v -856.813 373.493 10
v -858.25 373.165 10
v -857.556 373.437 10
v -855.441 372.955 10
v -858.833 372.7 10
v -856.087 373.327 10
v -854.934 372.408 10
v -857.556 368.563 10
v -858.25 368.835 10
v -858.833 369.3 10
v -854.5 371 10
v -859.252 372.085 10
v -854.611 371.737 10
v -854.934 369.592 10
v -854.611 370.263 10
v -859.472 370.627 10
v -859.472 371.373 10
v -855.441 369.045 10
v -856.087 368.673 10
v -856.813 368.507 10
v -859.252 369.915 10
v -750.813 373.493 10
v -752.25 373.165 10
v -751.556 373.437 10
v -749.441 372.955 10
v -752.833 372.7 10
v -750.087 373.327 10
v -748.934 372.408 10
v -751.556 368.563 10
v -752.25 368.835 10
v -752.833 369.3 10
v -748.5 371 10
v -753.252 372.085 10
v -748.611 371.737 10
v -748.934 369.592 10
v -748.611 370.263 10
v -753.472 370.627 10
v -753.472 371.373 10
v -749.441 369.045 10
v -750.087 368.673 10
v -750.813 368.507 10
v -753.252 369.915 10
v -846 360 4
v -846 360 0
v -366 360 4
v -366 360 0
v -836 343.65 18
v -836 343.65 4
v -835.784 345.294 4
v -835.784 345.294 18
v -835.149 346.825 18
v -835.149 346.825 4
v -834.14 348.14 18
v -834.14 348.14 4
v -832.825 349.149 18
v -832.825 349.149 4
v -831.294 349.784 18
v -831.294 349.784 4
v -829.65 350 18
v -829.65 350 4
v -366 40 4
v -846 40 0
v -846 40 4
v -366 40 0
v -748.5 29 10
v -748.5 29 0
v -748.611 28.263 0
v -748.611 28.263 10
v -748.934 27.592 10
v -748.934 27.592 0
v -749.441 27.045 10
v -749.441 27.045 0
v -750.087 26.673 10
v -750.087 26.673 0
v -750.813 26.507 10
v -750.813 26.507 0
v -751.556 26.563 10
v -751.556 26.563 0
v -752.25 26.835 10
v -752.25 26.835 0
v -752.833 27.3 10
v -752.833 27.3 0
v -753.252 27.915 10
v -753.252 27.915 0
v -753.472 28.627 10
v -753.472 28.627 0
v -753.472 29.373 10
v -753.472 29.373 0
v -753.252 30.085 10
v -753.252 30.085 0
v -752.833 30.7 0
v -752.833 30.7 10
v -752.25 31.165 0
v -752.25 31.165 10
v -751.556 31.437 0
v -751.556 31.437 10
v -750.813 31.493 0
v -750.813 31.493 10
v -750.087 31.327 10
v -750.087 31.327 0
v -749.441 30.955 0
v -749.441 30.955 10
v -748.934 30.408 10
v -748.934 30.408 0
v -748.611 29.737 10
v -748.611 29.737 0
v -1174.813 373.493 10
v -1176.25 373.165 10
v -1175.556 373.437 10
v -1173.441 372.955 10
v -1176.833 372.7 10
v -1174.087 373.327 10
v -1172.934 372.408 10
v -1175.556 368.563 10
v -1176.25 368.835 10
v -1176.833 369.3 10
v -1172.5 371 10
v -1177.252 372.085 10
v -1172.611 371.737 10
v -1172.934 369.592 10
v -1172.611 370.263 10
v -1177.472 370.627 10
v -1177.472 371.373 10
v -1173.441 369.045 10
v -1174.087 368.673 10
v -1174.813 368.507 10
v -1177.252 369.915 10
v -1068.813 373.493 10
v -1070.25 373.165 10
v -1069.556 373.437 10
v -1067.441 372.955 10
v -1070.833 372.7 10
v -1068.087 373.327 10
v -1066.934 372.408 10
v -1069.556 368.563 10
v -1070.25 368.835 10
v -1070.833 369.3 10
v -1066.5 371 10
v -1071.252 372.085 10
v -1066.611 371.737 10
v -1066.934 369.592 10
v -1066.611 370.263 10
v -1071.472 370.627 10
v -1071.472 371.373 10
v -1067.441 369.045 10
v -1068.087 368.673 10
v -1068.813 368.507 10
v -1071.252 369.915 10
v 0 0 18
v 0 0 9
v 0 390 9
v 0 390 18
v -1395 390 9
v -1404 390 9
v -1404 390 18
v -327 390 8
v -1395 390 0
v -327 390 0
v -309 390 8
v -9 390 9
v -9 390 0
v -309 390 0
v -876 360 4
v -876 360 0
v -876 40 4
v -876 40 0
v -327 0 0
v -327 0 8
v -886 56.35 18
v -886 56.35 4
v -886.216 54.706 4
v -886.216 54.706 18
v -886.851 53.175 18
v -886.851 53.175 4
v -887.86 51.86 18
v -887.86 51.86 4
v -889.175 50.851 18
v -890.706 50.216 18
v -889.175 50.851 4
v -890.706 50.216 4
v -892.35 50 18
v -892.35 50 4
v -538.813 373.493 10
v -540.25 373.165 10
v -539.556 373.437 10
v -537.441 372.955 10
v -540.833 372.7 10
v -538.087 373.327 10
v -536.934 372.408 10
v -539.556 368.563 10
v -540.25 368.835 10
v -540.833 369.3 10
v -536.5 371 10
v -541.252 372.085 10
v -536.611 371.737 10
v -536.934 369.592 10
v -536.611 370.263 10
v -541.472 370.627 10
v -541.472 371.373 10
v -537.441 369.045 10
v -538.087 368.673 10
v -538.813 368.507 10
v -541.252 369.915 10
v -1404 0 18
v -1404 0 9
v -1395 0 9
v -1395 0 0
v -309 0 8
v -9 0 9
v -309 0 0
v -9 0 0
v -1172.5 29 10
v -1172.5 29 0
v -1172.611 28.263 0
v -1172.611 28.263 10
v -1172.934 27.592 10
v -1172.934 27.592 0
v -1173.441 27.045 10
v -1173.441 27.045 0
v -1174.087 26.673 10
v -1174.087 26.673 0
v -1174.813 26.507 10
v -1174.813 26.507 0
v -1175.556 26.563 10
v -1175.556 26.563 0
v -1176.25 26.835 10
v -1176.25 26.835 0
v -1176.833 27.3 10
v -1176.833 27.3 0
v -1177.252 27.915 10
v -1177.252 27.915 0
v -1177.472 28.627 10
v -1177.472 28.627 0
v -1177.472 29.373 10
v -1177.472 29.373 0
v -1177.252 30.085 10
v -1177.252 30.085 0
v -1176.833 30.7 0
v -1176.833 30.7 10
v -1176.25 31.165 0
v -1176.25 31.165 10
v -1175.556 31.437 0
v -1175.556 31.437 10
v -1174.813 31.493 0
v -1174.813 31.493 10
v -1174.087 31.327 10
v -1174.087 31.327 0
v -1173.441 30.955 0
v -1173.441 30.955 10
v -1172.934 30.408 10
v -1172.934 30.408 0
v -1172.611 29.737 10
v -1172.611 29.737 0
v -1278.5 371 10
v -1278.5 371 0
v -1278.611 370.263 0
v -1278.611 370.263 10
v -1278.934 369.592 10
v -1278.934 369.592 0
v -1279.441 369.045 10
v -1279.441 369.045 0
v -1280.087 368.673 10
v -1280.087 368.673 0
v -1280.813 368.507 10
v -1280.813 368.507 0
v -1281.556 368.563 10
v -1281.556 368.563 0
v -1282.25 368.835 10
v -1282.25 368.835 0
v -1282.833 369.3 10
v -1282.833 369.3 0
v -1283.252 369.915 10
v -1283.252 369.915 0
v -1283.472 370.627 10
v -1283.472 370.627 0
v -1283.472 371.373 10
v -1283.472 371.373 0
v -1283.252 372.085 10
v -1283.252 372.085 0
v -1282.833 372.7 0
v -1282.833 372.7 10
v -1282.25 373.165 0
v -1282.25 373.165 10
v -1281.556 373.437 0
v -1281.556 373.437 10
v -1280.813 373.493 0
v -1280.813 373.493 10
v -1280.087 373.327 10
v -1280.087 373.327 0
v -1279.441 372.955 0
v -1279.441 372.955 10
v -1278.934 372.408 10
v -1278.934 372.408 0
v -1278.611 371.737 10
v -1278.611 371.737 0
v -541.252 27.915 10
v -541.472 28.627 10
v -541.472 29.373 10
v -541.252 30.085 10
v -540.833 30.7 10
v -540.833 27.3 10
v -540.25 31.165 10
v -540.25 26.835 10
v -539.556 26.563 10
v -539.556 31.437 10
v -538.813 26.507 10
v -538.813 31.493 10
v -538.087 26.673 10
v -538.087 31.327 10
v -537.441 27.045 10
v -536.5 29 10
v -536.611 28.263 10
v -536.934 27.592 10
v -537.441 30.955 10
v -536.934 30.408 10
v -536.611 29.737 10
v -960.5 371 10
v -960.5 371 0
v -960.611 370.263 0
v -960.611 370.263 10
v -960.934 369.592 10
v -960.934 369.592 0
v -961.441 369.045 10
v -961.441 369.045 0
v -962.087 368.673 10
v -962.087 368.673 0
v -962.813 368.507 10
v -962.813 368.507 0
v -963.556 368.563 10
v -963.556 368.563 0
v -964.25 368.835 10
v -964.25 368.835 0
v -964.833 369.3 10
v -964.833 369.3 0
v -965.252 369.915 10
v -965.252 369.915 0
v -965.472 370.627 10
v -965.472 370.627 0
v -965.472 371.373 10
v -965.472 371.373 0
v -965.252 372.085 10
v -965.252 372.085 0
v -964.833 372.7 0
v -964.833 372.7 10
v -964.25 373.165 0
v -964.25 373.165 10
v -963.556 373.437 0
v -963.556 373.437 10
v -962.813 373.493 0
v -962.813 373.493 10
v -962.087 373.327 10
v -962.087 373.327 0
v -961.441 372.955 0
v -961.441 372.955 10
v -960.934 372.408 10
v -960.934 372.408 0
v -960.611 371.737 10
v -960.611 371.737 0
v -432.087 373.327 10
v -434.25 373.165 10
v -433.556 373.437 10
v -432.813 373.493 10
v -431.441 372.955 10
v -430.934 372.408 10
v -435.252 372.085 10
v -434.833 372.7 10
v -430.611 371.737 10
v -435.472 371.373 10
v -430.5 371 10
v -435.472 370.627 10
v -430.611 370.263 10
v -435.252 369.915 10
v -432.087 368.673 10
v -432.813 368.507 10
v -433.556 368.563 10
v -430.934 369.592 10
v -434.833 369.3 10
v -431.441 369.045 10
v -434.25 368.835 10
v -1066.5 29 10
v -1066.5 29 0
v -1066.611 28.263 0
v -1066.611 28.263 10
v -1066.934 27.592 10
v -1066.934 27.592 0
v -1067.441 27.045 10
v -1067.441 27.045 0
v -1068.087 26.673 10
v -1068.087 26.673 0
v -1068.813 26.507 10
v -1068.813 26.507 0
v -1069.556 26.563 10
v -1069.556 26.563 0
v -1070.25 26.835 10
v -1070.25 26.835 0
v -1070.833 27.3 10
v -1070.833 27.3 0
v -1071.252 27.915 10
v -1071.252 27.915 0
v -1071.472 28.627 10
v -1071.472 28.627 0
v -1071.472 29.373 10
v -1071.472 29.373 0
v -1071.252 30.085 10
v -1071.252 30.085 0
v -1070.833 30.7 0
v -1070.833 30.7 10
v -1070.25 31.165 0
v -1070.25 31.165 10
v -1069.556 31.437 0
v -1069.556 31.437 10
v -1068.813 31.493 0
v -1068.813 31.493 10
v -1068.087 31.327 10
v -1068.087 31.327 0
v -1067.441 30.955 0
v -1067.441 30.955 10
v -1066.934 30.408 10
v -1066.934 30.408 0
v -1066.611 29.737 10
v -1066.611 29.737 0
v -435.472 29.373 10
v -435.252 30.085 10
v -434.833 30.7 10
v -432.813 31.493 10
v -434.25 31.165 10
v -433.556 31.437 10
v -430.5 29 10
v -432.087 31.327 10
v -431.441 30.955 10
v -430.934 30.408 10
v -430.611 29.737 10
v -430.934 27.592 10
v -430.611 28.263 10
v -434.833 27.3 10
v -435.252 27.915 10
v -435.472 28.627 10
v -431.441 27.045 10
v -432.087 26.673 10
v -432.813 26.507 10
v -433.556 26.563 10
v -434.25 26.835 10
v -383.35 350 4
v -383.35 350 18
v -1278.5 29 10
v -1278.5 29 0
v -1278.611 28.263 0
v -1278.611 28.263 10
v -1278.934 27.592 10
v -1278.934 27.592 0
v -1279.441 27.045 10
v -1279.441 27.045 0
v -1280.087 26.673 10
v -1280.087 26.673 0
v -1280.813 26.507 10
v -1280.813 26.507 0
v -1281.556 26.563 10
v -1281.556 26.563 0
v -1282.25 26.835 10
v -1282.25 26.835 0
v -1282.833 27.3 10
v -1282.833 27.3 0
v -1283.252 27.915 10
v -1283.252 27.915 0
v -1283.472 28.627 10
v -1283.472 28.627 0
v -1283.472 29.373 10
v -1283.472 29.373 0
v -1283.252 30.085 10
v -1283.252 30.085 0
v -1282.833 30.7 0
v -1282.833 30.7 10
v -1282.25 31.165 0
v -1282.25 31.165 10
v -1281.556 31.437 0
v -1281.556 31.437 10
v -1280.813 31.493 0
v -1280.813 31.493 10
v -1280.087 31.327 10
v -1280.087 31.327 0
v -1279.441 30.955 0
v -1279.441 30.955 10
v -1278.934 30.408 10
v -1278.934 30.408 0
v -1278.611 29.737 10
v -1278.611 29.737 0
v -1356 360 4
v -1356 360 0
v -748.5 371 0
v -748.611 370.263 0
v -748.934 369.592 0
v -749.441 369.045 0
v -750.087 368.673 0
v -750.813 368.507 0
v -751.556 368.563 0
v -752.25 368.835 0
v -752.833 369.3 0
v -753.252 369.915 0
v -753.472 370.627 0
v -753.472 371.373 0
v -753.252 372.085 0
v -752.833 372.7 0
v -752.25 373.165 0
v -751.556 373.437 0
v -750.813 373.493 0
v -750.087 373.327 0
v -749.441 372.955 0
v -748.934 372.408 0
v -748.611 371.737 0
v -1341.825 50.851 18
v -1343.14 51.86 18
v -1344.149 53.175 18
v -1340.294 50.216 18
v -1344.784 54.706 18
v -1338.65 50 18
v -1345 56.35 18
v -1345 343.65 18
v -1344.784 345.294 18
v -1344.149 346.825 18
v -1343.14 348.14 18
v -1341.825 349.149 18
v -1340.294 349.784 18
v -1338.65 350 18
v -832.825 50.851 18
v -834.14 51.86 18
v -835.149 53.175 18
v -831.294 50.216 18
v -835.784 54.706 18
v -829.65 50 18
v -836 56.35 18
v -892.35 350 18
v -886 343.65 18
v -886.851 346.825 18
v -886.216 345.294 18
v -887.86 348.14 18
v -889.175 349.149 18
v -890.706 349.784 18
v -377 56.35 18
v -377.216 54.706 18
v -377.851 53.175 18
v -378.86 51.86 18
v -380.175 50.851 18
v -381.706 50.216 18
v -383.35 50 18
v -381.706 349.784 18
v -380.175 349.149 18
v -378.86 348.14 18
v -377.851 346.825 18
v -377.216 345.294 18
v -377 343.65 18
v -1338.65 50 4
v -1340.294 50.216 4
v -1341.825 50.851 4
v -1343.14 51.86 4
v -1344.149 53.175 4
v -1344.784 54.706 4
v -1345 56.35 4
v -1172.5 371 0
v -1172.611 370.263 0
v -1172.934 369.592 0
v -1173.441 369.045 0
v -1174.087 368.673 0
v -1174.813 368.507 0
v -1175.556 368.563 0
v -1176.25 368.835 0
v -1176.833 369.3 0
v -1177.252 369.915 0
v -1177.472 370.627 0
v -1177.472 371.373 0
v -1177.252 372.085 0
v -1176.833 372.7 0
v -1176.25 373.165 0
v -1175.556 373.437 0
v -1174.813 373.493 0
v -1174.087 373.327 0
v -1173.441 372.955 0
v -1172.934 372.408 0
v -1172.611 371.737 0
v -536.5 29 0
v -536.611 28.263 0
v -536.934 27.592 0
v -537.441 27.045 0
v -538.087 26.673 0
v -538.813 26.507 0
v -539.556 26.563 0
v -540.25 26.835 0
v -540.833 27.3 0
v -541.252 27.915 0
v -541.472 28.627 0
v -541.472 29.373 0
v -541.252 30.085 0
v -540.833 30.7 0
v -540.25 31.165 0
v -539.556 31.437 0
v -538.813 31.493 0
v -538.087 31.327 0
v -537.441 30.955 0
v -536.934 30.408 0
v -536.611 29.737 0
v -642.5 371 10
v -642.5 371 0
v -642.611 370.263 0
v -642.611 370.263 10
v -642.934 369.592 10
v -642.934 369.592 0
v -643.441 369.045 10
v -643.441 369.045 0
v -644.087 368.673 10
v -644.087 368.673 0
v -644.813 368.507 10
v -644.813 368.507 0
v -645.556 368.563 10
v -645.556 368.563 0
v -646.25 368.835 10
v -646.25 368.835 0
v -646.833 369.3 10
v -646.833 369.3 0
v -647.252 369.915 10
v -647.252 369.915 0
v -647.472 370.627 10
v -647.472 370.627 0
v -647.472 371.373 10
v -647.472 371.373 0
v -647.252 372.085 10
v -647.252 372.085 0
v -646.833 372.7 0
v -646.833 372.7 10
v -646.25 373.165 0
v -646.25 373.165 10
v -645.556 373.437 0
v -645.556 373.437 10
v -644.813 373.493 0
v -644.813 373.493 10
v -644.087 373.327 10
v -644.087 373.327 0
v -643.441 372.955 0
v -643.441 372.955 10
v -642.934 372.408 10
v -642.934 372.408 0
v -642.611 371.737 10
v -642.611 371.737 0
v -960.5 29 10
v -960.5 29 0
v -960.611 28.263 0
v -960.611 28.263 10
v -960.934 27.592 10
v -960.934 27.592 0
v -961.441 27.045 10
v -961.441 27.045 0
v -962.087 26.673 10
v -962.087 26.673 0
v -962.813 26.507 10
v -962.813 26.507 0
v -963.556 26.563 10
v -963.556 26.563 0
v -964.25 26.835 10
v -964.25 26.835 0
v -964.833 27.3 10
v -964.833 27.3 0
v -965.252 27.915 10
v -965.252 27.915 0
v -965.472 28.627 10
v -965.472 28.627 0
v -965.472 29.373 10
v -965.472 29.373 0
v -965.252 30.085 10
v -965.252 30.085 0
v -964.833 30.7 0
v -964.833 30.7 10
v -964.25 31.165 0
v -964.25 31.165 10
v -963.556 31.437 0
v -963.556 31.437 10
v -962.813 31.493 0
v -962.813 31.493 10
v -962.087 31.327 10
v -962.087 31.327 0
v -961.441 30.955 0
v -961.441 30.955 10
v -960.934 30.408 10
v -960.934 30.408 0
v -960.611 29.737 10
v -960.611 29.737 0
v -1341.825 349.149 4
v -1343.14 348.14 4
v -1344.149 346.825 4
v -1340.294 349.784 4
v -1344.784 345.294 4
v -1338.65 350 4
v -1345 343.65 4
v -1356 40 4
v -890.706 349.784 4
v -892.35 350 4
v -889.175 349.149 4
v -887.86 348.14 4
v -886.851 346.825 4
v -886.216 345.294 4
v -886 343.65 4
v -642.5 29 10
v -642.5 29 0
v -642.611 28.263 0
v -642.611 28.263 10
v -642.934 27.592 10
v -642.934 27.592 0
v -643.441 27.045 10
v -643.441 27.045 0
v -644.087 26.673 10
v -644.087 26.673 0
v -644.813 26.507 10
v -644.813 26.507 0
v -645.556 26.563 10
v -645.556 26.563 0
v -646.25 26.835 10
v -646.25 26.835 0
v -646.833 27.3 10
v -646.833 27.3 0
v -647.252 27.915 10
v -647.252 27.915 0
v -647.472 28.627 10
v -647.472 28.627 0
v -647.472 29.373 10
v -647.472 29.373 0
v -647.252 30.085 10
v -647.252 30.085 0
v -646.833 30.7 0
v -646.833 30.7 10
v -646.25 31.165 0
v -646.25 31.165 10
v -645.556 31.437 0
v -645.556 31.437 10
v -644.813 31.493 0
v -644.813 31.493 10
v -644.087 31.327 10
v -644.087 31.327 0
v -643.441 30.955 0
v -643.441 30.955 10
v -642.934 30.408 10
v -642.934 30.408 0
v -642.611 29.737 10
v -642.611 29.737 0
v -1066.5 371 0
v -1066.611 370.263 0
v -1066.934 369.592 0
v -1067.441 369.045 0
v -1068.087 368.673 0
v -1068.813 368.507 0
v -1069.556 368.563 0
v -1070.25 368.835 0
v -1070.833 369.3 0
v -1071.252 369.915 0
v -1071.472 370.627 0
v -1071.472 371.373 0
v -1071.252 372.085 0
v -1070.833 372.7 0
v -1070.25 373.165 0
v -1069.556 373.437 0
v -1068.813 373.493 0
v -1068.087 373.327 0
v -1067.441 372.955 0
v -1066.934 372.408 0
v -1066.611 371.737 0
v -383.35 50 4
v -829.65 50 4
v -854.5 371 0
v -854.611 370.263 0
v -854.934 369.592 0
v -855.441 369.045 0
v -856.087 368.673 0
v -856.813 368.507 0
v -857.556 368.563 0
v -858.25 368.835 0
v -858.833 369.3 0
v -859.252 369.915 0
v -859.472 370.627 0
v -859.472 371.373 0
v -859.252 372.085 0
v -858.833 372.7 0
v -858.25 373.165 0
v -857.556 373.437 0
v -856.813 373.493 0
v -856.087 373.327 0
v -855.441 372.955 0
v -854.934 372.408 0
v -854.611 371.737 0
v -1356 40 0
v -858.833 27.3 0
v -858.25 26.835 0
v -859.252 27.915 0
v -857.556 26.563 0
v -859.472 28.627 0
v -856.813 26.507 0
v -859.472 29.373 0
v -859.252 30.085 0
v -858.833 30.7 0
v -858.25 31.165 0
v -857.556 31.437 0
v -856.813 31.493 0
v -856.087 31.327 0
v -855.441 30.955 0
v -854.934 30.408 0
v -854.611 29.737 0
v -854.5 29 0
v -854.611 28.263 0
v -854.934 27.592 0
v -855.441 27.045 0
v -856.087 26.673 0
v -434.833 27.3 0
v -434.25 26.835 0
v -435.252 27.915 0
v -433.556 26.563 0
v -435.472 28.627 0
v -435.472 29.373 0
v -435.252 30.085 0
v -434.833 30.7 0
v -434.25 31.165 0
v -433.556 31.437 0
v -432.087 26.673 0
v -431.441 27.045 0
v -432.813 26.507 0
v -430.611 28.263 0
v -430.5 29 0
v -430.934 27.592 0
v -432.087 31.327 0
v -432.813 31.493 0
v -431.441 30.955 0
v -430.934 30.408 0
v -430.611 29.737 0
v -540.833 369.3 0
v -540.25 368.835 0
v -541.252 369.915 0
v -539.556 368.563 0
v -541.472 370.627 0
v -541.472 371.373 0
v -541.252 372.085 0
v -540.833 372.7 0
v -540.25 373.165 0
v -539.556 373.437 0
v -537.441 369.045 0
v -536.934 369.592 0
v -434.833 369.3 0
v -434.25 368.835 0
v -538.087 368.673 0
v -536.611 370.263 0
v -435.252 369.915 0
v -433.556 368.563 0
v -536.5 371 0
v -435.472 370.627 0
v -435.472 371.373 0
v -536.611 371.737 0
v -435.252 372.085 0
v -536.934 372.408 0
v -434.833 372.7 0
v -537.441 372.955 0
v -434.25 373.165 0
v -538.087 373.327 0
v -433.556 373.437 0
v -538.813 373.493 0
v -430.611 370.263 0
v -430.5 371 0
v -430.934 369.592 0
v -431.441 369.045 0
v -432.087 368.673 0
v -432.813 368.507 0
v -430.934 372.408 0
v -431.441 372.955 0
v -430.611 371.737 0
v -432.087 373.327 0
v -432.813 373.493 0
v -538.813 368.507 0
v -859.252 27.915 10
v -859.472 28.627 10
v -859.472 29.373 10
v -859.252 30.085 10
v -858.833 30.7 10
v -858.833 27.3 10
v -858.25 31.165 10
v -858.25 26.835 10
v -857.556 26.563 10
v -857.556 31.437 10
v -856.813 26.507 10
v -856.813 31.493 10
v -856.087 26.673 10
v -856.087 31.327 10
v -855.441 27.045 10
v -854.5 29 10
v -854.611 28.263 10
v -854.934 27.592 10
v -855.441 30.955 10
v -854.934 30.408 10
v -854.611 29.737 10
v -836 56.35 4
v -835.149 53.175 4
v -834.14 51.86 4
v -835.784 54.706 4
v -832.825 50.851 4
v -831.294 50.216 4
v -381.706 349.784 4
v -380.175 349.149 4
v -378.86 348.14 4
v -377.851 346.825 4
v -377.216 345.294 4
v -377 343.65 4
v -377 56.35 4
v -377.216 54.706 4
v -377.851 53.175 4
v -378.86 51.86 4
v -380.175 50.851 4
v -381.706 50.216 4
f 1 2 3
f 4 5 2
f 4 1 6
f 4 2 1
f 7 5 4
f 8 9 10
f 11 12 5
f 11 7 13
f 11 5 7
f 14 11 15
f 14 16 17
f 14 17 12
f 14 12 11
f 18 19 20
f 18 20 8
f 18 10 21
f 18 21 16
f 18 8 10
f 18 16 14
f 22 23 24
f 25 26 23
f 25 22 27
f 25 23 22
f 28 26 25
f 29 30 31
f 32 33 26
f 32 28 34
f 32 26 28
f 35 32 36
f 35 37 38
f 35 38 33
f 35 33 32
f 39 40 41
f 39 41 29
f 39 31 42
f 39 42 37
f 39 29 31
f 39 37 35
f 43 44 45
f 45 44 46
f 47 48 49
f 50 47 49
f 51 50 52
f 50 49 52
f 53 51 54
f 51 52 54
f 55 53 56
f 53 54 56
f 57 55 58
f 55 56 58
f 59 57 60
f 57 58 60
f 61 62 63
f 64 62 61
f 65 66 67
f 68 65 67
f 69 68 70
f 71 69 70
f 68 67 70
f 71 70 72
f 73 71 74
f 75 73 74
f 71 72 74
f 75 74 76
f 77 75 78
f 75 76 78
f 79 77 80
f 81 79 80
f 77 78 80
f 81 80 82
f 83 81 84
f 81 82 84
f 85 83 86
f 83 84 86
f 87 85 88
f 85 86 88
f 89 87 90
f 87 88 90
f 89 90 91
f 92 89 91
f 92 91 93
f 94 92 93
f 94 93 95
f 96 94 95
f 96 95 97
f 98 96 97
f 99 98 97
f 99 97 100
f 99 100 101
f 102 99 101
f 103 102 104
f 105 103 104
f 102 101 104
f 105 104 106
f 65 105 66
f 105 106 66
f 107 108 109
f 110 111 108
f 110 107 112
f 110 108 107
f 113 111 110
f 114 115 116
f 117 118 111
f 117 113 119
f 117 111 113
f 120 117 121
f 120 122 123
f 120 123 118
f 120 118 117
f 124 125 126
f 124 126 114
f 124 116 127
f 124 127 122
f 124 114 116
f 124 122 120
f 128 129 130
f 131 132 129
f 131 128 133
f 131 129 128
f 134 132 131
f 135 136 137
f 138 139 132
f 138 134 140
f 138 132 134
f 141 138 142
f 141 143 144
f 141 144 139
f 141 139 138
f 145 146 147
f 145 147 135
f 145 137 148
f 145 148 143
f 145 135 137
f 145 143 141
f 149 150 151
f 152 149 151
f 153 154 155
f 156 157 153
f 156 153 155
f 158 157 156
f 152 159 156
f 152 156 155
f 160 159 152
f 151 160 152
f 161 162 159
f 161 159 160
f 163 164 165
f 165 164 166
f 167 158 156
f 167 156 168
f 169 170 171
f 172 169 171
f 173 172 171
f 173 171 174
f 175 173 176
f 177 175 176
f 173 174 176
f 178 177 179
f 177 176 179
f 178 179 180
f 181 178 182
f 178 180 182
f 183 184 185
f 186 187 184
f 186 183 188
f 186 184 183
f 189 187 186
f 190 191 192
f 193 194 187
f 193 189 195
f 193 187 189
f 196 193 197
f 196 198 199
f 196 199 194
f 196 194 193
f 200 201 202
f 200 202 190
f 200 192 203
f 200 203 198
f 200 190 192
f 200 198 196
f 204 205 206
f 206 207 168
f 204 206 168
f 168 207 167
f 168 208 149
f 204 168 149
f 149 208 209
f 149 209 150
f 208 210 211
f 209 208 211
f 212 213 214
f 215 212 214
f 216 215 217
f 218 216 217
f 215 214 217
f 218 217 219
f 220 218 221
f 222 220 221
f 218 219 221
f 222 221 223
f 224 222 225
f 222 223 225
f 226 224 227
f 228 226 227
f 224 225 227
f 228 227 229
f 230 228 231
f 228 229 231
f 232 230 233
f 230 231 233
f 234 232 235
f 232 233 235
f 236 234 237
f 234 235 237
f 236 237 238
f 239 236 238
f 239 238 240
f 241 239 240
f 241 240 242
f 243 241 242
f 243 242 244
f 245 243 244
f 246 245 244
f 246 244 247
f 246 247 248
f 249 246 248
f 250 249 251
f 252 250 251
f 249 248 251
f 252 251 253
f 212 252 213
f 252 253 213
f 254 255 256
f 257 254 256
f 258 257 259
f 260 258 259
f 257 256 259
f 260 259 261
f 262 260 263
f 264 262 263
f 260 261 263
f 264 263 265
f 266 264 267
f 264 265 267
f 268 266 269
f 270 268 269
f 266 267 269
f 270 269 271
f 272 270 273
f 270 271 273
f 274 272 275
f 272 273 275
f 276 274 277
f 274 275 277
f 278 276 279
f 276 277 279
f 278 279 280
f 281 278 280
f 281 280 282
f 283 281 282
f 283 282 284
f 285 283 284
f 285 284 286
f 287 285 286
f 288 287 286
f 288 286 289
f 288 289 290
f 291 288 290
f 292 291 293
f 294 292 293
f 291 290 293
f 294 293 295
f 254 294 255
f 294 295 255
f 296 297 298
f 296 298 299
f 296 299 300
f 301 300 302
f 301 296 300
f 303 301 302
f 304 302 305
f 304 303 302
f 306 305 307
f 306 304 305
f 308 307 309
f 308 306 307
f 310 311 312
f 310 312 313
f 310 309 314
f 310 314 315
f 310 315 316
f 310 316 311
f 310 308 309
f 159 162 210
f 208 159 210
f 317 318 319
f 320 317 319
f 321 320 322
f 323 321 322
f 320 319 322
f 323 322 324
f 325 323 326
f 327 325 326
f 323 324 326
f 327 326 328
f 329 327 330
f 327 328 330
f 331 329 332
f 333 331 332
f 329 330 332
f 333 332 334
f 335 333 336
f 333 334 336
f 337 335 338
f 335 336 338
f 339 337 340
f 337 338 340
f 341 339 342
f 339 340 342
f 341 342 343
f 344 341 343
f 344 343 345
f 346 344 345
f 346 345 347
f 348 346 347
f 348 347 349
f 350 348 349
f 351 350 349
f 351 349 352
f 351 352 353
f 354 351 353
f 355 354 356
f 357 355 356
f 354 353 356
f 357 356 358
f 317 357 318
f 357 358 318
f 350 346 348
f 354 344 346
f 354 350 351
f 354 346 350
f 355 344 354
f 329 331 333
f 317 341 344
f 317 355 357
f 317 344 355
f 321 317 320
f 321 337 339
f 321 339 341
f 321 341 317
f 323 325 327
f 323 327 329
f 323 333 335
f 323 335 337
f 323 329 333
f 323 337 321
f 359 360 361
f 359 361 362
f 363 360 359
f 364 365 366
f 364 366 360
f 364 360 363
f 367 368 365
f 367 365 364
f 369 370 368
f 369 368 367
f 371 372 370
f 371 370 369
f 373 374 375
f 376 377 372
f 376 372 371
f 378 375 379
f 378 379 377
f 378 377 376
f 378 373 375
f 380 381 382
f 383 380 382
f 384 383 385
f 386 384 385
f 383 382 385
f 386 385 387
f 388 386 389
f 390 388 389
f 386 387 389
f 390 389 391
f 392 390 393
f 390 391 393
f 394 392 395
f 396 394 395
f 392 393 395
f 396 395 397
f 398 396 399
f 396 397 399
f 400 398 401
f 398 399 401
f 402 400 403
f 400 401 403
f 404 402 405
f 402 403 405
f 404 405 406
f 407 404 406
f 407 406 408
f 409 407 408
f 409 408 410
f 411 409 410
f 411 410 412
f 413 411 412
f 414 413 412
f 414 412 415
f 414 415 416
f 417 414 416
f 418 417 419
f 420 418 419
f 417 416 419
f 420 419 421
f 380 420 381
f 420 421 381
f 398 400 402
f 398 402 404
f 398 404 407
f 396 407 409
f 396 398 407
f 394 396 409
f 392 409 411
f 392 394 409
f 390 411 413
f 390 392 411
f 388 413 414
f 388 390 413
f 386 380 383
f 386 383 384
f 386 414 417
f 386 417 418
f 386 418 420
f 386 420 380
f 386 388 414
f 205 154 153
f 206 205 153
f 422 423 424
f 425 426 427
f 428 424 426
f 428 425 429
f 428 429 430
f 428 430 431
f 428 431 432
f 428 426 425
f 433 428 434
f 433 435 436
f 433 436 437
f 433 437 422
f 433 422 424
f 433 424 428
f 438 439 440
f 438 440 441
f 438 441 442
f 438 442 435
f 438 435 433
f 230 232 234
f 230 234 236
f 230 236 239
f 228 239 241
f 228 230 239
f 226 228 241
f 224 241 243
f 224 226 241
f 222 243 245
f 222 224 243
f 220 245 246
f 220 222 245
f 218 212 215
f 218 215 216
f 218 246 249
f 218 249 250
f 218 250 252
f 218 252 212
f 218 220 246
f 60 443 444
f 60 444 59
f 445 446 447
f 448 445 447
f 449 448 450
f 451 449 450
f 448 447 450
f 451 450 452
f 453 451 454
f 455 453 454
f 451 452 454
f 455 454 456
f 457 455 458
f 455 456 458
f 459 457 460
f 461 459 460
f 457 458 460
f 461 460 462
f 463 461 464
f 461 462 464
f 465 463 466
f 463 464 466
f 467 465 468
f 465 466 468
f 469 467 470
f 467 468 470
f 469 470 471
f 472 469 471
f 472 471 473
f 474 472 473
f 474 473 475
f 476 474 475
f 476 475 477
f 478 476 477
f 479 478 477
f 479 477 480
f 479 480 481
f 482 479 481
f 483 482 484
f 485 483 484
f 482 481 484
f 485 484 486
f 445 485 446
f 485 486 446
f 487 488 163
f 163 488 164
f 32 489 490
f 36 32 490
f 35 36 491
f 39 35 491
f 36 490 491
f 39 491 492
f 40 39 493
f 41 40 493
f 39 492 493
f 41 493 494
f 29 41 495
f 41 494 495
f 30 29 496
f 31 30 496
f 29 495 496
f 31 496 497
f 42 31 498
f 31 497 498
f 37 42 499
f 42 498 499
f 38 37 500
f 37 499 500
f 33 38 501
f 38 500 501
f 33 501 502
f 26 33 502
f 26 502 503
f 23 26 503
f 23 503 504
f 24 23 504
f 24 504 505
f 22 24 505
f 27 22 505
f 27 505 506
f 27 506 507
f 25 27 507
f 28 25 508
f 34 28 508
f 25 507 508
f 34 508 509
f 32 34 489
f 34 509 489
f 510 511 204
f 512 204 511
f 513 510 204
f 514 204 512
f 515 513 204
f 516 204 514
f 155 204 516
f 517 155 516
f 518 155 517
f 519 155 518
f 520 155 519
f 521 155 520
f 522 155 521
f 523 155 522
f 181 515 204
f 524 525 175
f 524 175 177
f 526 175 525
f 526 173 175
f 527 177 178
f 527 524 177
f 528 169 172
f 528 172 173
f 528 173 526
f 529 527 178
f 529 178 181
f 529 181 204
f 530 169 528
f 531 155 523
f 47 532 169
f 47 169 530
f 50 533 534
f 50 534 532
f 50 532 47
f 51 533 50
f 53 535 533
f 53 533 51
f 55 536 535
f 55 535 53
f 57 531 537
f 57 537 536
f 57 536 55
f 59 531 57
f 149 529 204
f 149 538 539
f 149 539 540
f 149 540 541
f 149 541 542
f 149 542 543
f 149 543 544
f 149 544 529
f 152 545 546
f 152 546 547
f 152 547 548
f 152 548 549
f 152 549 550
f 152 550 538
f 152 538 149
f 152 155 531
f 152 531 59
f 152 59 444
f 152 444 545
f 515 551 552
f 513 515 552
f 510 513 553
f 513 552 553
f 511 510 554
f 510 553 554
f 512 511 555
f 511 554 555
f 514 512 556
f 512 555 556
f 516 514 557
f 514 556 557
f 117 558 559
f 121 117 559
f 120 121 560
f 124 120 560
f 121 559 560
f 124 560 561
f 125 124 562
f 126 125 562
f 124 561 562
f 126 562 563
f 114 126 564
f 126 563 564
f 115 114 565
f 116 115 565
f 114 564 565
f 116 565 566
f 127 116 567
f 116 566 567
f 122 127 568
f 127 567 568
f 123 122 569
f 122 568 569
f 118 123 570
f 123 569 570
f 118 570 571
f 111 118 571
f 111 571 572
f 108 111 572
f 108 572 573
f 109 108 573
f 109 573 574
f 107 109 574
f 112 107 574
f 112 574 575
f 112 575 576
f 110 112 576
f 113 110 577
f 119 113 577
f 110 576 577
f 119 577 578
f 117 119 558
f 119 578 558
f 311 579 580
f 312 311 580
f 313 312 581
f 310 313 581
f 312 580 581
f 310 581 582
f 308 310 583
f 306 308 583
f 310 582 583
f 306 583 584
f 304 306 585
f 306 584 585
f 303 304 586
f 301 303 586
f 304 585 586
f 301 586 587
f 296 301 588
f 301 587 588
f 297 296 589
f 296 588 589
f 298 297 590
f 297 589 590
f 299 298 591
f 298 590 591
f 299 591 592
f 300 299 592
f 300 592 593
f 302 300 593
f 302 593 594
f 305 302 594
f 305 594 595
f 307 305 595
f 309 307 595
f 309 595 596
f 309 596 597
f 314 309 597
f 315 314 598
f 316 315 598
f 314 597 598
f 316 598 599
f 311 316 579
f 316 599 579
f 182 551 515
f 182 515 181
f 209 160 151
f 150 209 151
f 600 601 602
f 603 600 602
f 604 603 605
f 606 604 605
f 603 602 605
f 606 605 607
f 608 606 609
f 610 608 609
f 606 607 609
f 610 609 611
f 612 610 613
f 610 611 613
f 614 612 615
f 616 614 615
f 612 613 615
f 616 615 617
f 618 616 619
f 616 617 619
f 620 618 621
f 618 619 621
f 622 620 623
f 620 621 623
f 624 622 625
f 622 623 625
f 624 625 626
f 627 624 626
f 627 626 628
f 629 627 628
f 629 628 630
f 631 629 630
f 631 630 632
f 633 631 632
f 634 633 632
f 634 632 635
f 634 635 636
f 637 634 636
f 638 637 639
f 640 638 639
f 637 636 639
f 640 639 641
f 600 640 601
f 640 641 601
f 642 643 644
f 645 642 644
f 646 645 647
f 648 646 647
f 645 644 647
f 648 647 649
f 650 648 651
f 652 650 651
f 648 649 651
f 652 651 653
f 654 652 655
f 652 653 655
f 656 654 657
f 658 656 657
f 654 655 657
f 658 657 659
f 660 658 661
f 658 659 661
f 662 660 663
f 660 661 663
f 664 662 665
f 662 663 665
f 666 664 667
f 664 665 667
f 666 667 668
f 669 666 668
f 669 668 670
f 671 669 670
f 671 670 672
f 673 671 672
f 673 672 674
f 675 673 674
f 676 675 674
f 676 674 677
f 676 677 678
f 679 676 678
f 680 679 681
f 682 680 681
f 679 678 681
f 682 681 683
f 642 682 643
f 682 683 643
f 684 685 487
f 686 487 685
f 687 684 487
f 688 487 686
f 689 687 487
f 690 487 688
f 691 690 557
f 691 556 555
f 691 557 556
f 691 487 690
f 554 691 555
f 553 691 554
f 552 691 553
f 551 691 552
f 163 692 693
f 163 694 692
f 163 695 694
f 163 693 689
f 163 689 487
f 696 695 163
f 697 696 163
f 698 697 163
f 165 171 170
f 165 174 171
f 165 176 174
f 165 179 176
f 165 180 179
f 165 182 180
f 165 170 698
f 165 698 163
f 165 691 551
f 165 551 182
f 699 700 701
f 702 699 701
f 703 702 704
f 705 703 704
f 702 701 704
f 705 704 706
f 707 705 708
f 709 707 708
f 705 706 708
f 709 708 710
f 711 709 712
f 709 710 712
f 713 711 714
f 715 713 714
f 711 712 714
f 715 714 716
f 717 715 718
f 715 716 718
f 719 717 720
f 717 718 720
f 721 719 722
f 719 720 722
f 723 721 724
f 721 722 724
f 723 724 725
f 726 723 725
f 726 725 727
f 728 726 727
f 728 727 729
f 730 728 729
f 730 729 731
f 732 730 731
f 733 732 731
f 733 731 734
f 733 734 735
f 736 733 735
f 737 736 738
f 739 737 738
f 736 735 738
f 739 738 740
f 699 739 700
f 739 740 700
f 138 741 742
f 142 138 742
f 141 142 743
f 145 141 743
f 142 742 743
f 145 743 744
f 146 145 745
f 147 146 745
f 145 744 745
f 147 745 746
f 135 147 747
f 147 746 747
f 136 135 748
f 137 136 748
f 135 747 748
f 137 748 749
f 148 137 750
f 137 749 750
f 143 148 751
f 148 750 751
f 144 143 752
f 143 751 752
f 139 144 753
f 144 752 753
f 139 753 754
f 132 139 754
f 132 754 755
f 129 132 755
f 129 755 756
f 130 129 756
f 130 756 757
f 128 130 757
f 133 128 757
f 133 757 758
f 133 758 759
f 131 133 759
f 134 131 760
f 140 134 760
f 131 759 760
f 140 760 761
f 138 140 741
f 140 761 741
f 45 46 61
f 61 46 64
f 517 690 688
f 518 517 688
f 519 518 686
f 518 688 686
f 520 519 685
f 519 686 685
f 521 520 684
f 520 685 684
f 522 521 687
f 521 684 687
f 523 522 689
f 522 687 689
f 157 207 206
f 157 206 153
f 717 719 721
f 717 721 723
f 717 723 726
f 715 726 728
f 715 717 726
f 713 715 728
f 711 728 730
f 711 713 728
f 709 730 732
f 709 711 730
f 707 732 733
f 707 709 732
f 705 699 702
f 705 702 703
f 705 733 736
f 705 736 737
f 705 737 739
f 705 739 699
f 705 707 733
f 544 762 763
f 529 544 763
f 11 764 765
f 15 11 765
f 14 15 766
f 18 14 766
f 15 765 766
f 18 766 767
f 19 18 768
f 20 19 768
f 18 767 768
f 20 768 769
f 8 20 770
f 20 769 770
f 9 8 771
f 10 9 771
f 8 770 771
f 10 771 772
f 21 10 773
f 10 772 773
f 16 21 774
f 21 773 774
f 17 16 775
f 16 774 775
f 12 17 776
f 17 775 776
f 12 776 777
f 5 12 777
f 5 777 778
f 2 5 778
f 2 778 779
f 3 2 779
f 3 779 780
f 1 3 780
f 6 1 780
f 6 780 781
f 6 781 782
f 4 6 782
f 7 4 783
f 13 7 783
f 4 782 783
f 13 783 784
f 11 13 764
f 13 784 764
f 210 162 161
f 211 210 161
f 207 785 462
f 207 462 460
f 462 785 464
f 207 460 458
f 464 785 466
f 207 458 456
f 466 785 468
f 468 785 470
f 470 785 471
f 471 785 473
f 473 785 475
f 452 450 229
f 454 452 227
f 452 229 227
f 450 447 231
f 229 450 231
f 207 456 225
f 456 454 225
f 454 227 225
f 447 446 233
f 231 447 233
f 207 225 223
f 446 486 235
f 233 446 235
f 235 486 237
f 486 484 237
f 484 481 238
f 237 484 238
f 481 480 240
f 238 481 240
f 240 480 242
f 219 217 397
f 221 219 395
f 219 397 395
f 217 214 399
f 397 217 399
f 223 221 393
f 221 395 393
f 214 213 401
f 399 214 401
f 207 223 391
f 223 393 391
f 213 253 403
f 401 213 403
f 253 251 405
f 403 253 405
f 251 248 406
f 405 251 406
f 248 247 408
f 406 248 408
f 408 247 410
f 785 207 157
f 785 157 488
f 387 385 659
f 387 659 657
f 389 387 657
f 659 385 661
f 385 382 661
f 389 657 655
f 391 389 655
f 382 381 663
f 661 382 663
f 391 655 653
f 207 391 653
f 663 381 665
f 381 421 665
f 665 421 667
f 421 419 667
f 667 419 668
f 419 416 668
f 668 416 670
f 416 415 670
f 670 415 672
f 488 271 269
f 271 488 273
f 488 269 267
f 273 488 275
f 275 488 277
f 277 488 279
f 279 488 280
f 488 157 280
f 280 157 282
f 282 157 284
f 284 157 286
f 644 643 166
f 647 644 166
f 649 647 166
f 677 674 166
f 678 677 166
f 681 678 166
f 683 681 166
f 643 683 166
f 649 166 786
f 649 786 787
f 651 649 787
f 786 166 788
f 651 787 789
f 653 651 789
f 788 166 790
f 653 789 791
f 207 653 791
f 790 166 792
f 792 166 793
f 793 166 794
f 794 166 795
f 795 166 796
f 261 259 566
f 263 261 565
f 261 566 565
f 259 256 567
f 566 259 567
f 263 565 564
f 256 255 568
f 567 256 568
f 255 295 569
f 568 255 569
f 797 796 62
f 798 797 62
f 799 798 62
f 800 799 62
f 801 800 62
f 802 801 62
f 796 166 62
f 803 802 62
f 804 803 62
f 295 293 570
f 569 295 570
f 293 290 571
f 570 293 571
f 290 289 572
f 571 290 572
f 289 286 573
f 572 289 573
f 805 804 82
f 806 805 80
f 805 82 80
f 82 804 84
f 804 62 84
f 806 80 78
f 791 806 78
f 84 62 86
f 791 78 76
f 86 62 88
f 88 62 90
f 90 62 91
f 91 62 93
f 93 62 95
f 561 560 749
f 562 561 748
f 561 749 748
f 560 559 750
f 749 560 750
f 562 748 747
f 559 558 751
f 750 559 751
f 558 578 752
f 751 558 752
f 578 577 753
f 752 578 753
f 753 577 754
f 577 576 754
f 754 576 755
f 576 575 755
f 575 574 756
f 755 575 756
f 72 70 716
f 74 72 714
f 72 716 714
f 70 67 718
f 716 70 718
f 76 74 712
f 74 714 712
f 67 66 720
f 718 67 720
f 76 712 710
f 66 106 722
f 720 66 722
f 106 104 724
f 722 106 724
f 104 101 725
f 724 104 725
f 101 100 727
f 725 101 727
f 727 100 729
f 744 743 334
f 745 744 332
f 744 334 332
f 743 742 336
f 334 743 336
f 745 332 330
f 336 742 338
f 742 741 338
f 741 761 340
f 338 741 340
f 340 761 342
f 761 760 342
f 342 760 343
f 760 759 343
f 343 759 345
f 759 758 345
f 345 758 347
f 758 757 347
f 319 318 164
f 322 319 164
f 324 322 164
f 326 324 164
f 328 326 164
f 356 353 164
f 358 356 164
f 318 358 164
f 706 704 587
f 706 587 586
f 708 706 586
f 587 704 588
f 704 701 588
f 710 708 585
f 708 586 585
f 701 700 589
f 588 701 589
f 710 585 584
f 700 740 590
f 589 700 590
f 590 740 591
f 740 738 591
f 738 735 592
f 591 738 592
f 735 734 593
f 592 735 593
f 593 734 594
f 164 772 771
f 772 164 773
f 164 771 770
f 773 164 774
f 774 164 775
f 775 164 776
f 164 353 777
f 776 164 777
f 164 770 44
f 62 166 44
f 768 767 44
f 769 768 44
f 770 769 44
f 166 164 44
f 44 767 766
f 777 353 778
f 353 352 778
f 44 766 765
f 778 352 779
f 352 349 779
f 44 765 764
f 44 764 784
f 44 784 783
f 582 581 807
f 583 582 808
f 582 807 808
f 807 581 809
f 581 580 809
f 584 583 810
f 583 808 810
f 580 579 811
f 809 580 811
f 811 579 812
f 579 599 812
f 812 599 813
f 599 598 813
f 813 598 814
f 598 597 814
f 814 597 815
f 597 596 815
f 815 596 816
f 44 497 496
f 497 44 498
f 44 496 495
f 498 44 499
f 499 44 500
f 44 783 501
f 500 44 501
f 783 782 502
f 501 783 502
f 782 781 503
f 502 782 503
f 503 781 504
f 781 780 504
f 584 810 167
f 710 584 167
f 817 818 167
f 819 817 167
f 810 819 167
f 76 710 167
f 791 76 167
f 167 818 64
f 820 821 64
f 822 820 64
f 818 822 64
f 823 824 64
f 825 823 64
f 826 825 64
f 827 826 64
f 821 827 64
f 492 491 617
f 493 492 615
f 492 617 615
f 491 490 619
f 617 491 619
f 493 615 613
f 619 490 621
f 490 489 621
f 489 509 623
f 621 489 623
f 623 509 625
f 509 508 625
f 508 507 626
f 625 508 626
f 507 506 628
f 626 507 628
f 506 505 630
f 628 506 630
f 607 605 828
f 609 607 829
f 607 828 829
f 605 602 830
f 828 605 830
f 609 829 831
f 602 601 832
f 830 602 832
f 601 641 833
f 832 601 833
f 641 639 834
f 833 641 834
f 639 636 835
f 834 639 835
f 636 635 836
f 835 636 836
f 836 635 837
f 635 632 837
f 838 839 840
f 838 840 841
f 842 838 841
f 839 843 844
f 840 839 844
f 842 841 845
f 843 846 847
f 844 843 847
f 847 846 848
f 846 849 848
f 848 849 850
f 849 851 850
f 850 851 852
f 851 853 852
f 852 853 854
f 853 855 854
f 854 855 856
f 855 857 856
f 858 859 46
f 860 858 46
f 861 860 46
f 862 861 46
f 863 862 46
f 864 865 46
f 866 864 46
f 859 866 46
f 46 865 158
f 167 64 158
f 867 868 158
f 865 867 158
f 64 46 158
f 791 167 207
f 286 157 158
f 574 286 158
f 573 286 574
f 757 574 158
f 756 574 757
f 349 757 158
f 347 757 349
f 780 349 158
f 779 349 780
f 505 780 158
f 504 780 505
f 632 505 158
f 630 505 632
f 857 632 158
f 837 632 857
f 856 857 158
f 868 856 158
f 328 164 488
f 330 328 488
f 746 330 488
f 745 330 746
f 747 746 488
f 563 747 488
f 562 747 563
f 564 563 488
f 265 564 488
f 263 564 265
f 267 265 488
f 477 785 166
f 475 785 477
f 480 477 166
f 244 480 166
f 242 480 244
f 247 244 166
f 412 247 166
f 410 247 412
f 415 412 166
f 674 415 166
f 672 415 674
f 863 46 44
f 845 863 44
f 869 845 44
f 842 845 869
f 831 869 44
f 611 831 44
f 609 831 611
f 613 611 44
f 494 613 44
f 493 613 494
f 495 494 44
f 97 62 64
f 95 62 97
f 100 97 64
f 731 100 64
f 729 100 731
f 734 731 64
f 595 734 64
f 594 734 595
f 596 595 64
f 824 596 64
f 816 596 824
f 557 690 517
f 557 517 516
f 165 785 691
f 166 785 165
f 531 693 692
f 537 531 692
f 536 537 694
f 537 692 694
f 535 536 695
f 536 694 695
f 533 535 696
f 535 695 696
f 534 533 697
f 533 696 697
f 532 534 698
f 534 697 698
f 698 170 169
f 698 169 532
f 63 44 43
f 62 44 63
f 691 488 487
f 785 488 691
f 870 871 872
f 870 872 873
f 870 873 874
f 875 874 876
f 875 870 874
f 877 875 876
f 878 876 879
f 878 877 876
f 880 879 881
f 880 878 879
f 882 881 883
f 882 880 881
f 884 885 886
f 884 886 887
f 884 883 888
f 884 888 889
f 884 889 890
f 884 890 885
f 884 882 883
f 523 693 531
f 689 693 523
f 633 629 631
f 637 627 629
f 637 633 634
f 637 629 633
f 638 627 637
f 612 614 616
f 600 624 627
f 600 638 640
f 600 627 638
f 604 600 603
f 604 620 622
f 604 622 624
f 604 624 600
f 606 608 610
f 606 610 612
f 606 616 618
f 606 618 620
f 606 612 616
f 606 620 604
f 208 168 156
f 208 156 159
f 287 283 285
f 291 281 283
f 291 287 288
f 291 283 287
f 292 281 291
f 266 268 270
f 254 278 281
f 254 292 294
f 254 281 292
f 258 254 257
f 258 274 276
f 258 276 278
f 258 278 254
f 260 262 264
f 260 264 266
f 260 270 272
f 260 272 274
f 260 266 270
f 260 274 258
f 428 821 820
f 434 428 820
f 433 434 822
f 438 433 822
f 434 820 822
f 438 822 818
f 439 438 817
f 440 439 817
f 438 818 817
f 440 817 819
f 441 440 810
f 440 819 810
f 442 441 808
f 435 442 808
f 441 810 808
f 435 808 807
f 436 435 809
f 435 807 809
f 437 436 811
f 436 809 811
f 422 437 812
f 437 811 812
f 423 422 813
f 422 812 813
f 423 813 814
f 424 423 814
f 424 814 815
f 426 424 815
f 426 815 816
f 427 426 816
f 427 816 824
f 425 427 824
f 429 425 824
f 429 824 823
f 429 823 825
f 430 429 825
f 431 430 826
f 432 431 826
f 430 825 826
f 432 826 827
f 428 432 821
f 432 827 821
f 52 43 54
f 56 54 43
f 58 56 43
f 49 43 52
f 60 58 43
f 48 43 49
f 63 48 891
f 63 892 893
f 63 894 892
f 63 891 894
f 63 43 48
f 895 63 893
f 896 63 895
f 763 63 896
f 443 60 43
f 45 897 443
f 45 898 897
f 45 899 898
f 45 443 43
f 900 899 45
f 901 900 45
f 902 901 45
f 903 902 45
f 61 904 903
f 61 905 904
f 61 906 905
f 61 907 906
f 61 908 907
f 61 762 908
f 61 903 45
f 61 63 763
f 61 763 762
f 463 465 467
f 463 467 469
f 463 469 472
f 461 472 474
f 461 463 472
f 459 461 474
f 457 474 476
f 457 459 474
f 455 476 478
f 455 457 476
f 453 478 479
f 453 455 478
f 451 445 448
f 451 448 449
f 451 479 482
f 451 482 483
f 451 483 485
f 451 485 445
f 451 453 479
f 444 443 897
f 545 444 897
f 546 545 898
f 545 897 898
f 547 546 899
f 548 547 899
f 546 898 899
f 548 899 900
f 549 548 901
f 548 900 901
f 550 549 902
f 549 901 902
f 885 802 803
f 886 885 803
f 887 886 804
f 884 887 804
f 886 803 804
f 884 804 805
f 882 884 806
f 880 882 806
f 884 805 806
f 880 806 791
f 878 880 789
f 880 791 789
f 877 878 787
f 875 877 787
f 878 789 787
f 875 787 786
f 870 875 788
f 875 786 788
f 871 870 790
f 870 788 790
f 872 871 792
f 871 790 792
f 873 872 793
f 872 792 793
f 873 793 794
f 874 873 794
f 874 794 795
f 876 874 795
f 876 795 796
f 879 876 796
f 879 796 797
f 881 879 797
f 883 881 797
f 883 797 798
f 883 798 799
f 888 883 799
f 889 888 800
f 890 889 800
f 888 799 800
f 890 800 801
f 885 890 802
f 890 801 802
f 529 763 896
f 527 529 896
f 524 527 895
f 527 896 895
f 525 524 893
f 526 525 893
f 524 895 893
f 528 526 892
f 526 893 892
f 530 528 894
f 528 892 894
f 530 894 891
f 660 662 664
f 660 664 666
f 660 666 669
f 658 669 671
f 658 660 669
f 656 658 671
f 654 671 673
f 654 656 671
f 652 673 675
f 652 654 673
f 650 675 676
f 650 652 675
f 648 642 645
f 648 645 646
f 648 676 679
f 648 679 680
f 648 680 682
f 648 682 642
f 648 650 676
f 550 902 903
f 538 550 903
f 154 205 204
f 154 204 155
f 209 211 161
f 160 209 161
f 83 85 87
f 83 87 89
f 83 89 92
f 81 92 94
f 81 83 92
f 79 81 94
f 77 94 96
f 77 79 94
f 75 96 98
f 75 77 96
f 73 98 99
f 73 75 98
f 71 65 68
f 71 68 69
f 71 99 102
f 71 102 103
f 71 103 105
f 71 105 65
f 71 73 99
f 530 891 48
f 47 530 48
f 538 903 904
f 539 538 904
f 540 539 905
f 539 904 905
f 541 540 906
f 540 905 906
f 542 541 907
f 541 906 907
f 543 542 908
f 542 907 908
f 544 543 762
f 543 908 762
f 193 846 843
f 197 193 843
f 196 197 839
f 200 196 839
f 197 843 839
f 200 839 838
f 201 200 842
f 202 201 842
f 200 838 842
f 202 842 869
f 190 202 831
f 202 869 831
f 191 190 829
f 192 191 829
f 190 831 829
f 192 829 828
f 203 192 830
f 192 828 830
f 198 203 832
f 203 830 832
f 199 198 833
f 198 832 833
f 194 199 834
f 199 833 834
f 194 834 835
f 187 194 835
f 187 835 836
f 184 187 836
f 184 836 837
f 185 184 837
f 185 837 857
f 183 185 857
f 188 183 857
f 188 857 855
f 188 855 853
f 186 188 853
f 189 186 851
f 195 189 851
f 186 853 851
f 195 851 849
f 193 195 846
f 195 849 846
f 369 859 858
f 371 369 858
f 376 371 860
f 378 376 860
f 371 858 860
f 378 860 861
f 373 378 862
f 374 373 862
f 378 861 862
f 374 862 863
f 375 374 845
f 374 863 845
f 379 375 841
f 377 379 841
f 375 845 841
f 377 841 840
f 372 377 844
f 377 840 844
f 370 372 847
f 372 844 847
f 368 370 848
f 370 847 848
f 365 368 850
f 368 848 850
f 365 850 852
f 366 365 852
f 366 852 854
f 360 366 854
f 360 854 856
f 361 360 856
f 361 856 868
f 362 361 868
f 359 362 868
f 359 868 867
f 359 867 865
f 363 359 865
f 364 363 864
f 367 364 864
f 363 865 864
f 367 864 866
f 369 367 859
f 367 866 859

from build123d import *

# Parameters (mm, degrees)
SKETCH_W        = 1404
SKETCH_H        = 390
PAD_DEPTH       = 18
SKETCH001_W     = 9
SKETCH001_H     = 390
POCKET_DEPTH    = 9
SKETCH002_W     = 18
SKETCH002_H     = 390
POCKET001_DEPTH = 8
POCKET003_DEPTH = 18.001
SKETCH005_W     = 480
SKETCH005_H     = 320
POCKET004_DEPTH = 4
SKETCH006_R     = 2.5
POCKET005_DEPTH = 10


with BuildPart() as part:
    # Sketch → Pad (new body)
    with BuildSketch(Plane.XY):
        with Locations((-702, 195)):
            Rectangle(SKETCH_W, SKETCH_H)
    extrude(amount=PAD_DEPTH)

    # Sketch001 → Pocket (cut)
    with BuildSketch(Plane.XY):
        with Locations((-4.5, 195)):
            Rectangle(SKETCH001_W, SKETCH001_H)
        with Locations((-1399.5, 195)):
            Rectangle(SKETCH001_W, SKETCH001_H)
    extrude(amount=POCKET_DEPTH, mode=Mode.SUBTRACT)

    # Sketch002 (on Face4 of Pocket) → Pocket001 (cut)
    with BuildSketch(Plane(origin=(0, 0, 0), x_dir=(1, 0, 0), z_dir=(0, 0, -1))):
        with Locations((-318, -195)):
            Rectangle(SKETCH002_W, SKETCH002_H)
    extrude(amount=-POCKET001_DEPTH, mode=Mode.SUBTRACT)

    # Sketch004 → Pocket003 (cut, through all)
    with BuildSketch(Plane(origin=(0, 0, 0), x_dir=(1, 0, 0), z_dir=(0, 0, -1))):
        with BuildLine():
            Line((-383.35, -350), (-829.65, -350))
            ThreePointArc((-836, -343.65), (-834.140128, -348.140128), (-829.65, -350))
            Line((-836, -56.35), (-836, -343.65))
            ThreePointArc((-829.65, -50), (-834.140128, -51.859872), (-836, -56.35))
            Line((-383.35, -50), (-829.65, -50))
            ThreePointArc((-377, -56.35), (-378.859872, -51.859872), (-383.35, -50))
            Line((-377, -343.65), (-377, -56.35))
            ThreePointArc((-383.35, -350), (-378.859872, -348.140128), (-377, -343.65))
        make_face()
        with BuildLine():
            Line((-886, -56.35), (-886, -343.65))
            ThreePointArc((-892.35, -350), (-887.859872, -348.140128), (-886, -343.65))
            Line((-892.35, -350), (-1338.65, -350))
            ThreePointArc((-1345, -343.65), (-1343.140128, -348.140128), (-1338.65, -350))
            Line((-1345, -343.65), (-1345, -56.35))
            ThreePointArc((-1338.65, -50), (-1343.140128, -51.859872), (-1345, -56.35))
            Line((-1338.65, -50), (-892.35, -50))
            ThreePointArc((-886, -56.35), (-887.859872, -51.859872), (-892.35, -50))
        make_face()
    extrude(amount=-POCKET003_DEPTH, mode=Mode.SUBTRACT)

    # Sketch005 (on Face4 of Pocket003) → Pocket004 (cut)
    with BuildSketch(Plane(origin=(0, 0, 0), x_dir=(1, 0, 0), z_dir=(0, 0, -1))):
        with Locations((-606, -200)):
            Rectangle(SKETCH005_W, SKETCH005_H)
        with Locations((-1116, -200)):
            Rectangle(SKETCH005_W, SKETCH005_H)
    extrude(amount=-POCKET004_DEPTH, mode=Mode.SUBTRACT)

    # Sketch006 (on Face4 of Pocket004) → Pocket005 (cut)
    with BuildSketch(Plane(origin=(0, 0, 0), x_dir=(1, 0, 0), z_dir=(0, 0, -1))):
        with Locations((-433, -29)):
            Circle(SKETCH006_R)
        with Locations((-539, -29)):
            Circle(SKETCH006_R)
        with Locations((-645, -29)):
            Circle(SKETCH006_R)
        with Locations((-751, -29)):
            Circle(SKETCH006_R)
        with Locations((-857, -29)):
            Circle(SKETCH006_R)
        with Locations((-963, -29)):
            Circle(SKETCH006_R)
        with Locations((-1069, -29)):
            Circle(SKETCH006_R)
        with Locations((-1175, -29)):
            Circle(SKETCH006_R)
        with Locations((-1281, -29)):
            Circle(SKETCH006_R)
        with Locations((-433, -371)):
            Circle(SKETCH006_R)
        with Locations((-539, -371)):
            Circle(SKETCH006_R)
        with Locations((-645, -371)):
            Circle(SKETCH006_R)
        with Locations((-751, -371)):
            Circle(SKETCH006_R)
        with Locations((-857, -371)):
            Circle(SKETCH006_R)
        with Locations((-963, -371)):
            Circle(SKETCH006_R)
        with Locations((-1069, -371)):
            Circle(SKETCH006_R)
        with Locations((-1175, -371)):
            Circle(SKETCH006_R)
        with Locations((-1281, -371)):
            Circle(SKETCH006_R)
    extrude(amount=-POCKET005_DEPTH, mode=Mode.SUBTRACT)


solid = part.part
